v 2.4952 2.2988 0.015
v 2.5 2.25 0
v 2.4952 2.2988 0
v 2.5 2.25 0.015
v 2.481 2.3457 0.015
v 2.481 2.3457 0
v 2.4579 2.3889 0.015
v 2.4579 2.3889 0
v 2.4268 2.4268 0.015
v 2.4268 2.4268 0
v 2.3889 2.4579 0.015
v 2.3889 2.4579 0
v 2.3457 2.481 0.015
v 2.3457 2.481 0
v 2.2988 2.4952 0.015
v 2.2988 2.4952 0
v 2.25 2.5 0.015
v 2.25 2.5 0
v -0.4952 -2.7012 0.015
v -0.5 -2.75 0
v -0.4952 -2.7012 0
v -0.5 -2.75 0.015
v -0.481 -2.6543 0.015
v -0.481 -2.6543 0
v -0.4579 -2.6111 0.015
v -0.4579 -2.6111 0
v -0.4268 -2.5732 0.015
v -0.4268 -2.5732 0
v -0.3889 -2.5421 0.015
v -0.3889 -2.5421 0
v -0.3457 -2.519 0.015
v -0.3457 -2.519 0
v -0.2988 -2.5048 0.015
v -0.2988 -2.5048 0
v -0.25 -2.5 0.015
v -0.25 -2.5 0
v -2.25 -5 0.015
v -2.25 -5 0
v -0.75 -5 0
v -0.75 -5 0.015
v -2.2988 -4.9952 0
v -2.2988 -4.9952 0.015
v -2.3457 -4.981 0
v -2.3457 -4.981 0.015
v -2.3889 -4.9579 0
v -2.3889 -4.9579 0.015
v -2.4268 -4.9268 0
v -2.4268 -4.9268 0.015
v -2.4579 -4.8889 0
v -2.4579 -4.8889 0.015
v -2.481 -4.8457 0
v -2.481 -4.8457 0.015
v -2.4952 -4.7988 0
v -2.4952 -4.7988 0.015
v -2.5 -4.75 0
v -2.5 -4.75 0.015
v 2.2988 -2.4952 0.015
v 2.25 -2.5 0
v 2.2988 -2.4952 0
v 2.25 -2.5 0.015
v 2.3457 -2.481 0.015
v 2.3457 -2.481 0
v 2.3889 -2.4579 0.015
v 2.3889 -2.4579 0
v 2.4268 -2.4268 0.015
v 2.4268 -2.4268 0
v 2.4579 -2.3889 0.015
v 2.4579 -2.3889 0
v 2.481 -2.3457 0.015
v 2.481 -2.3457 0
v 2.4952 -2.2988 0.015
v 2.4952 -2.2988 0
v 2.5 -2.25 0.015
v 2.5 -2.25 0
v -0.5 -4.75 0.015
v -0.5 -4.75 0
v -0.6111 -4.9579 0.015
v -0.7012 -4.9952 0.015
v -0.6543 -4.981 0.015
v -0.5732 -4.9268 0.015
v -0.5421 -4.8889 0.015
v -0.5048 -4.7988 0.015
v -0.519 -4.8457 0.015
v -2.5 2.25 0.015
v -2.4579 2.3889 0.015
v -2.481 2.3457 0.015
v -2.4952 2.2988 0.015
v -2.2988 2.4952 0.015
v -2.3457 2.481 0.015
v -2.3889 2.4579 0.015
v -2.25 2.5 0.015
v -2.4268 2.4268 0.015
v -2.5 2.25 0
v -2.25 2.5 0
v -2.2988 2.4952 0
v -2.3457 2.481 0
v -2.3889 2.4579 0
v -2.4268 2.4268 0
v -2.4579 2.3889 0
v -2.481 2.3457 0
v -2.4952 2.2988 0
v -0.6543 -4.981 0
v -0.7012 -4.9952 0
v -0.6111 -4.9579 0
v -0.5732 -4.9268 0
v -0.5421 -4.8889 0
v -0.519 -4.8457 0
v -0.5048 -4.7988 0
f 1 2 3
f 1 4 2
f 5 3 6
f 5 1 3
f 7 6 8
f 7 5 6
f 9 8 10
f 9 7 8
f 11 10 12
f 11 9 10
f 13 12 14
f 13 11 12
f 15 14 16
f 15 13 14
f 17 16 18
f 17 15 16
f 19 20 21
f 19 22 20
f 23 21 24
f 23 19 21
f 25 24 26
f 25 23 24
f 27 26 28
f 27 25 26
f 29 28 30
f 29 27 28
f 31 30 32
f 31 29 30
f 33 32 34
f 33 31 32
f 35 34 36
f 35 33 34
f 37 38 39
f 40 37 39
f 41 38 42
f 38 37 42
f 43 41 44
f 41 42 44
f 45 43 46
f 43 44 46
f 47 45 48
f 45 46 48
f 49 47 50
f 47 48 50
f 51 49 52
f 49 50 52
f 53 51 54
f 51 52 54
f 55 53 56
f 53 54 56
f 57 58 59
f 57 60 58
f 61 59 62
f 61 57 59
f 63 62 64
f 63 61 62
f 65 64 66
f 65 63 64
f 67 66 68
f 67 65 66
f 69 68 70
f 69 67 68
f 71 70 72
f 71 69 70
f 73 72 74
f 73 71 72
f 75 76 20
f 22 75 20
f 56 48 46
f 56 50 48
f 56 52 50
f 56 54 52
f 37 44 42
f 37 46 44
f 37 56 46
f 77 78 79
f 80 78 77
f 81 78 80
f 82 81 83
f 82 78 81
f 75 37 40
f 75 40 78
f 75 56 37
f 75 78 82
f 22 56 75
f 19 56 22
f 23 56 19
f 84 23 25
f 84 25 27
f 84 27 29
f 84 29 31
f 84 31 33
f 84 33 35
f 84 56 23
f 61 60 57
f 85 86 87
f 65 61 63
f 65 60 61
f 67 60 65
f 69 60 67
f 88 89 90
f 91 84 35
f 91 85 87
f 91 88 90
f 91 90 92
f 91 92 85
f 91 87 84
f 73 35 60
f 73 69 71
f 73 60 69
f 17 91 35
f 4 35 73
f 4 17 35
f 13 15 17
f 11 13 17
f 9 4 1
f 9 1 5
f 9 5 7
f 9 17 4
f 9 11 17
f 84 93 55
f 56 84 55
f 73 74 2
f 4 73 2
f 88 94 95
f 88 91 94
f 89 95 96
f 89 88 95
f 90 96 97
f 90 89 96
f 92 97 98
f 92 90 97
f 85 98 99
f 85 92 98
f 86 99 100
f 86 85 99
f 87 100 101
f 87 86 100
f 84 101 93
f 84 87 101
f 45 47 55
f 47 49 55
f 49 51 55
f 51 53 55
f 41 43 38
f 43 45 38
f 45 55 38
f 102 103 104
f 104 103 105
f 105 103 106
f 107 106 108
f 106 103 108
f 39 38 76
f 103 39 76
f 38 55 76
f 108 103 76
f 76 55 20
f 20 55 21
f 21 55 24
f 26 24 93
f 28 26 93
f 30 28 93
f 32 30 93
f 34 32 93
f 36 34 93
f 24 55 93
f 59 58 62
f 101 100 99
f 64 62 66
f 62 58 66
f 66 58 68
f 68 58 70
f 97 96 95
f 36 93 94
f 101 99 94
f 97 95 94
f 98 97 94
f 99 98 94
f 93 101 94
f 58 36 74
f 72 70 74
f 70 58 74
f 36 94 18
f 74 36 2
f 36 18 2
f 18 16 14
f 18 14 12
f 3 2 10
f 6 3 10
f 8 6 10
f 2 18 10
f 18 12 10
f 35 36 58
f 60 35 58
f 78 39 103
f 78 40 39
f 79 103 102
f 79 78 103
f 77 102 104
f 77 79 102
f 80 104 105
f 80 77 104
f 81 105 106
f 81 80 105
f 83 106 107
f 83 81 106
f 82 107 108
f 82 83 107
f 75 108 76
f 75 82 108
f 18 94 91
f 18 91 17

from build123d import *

# Parameters (mm, degrees)
SKETCH1_W           = 2
SKETCH1_H           = 2.5
SKETCH1_W_2         = 5
SKETCH1_H_2         = 5
BOSS_EXTRUDE1_DEPTH = 0.015
FILLET1_R           = 0.25


with BuildPart() as part:
    # Sketch1 → Boss-Extrude1 (new body)
    with BuildSketch(Plane.XY):
        with Locations((-1.5, -3.75)):
            Rectangle(SKETCH1_W, SKETCH1_H)
        Rectangle(SKETCH1_W_2, SKETCH1_H_2)
    extrude(amount=BOSS_EXTRUDE1_DEPTH)

    # Fillet1
    fillet1_edges = [part.edges().sort_by_distance(p)[0] for p in [
        (-0.5, -5, 0.0075),
        (-2.5, -5, 0.0075),
        (-2.5, 2.5, 0.0075),
        (2.5, 2.5, 0.0075),
        (2.5, -2.5, 0.0075),
        (-0.5, -2.5, 0.0075),
    ]]
    fillet(fillet1_edges, radius=FILLET1_R)


solid = part.part
